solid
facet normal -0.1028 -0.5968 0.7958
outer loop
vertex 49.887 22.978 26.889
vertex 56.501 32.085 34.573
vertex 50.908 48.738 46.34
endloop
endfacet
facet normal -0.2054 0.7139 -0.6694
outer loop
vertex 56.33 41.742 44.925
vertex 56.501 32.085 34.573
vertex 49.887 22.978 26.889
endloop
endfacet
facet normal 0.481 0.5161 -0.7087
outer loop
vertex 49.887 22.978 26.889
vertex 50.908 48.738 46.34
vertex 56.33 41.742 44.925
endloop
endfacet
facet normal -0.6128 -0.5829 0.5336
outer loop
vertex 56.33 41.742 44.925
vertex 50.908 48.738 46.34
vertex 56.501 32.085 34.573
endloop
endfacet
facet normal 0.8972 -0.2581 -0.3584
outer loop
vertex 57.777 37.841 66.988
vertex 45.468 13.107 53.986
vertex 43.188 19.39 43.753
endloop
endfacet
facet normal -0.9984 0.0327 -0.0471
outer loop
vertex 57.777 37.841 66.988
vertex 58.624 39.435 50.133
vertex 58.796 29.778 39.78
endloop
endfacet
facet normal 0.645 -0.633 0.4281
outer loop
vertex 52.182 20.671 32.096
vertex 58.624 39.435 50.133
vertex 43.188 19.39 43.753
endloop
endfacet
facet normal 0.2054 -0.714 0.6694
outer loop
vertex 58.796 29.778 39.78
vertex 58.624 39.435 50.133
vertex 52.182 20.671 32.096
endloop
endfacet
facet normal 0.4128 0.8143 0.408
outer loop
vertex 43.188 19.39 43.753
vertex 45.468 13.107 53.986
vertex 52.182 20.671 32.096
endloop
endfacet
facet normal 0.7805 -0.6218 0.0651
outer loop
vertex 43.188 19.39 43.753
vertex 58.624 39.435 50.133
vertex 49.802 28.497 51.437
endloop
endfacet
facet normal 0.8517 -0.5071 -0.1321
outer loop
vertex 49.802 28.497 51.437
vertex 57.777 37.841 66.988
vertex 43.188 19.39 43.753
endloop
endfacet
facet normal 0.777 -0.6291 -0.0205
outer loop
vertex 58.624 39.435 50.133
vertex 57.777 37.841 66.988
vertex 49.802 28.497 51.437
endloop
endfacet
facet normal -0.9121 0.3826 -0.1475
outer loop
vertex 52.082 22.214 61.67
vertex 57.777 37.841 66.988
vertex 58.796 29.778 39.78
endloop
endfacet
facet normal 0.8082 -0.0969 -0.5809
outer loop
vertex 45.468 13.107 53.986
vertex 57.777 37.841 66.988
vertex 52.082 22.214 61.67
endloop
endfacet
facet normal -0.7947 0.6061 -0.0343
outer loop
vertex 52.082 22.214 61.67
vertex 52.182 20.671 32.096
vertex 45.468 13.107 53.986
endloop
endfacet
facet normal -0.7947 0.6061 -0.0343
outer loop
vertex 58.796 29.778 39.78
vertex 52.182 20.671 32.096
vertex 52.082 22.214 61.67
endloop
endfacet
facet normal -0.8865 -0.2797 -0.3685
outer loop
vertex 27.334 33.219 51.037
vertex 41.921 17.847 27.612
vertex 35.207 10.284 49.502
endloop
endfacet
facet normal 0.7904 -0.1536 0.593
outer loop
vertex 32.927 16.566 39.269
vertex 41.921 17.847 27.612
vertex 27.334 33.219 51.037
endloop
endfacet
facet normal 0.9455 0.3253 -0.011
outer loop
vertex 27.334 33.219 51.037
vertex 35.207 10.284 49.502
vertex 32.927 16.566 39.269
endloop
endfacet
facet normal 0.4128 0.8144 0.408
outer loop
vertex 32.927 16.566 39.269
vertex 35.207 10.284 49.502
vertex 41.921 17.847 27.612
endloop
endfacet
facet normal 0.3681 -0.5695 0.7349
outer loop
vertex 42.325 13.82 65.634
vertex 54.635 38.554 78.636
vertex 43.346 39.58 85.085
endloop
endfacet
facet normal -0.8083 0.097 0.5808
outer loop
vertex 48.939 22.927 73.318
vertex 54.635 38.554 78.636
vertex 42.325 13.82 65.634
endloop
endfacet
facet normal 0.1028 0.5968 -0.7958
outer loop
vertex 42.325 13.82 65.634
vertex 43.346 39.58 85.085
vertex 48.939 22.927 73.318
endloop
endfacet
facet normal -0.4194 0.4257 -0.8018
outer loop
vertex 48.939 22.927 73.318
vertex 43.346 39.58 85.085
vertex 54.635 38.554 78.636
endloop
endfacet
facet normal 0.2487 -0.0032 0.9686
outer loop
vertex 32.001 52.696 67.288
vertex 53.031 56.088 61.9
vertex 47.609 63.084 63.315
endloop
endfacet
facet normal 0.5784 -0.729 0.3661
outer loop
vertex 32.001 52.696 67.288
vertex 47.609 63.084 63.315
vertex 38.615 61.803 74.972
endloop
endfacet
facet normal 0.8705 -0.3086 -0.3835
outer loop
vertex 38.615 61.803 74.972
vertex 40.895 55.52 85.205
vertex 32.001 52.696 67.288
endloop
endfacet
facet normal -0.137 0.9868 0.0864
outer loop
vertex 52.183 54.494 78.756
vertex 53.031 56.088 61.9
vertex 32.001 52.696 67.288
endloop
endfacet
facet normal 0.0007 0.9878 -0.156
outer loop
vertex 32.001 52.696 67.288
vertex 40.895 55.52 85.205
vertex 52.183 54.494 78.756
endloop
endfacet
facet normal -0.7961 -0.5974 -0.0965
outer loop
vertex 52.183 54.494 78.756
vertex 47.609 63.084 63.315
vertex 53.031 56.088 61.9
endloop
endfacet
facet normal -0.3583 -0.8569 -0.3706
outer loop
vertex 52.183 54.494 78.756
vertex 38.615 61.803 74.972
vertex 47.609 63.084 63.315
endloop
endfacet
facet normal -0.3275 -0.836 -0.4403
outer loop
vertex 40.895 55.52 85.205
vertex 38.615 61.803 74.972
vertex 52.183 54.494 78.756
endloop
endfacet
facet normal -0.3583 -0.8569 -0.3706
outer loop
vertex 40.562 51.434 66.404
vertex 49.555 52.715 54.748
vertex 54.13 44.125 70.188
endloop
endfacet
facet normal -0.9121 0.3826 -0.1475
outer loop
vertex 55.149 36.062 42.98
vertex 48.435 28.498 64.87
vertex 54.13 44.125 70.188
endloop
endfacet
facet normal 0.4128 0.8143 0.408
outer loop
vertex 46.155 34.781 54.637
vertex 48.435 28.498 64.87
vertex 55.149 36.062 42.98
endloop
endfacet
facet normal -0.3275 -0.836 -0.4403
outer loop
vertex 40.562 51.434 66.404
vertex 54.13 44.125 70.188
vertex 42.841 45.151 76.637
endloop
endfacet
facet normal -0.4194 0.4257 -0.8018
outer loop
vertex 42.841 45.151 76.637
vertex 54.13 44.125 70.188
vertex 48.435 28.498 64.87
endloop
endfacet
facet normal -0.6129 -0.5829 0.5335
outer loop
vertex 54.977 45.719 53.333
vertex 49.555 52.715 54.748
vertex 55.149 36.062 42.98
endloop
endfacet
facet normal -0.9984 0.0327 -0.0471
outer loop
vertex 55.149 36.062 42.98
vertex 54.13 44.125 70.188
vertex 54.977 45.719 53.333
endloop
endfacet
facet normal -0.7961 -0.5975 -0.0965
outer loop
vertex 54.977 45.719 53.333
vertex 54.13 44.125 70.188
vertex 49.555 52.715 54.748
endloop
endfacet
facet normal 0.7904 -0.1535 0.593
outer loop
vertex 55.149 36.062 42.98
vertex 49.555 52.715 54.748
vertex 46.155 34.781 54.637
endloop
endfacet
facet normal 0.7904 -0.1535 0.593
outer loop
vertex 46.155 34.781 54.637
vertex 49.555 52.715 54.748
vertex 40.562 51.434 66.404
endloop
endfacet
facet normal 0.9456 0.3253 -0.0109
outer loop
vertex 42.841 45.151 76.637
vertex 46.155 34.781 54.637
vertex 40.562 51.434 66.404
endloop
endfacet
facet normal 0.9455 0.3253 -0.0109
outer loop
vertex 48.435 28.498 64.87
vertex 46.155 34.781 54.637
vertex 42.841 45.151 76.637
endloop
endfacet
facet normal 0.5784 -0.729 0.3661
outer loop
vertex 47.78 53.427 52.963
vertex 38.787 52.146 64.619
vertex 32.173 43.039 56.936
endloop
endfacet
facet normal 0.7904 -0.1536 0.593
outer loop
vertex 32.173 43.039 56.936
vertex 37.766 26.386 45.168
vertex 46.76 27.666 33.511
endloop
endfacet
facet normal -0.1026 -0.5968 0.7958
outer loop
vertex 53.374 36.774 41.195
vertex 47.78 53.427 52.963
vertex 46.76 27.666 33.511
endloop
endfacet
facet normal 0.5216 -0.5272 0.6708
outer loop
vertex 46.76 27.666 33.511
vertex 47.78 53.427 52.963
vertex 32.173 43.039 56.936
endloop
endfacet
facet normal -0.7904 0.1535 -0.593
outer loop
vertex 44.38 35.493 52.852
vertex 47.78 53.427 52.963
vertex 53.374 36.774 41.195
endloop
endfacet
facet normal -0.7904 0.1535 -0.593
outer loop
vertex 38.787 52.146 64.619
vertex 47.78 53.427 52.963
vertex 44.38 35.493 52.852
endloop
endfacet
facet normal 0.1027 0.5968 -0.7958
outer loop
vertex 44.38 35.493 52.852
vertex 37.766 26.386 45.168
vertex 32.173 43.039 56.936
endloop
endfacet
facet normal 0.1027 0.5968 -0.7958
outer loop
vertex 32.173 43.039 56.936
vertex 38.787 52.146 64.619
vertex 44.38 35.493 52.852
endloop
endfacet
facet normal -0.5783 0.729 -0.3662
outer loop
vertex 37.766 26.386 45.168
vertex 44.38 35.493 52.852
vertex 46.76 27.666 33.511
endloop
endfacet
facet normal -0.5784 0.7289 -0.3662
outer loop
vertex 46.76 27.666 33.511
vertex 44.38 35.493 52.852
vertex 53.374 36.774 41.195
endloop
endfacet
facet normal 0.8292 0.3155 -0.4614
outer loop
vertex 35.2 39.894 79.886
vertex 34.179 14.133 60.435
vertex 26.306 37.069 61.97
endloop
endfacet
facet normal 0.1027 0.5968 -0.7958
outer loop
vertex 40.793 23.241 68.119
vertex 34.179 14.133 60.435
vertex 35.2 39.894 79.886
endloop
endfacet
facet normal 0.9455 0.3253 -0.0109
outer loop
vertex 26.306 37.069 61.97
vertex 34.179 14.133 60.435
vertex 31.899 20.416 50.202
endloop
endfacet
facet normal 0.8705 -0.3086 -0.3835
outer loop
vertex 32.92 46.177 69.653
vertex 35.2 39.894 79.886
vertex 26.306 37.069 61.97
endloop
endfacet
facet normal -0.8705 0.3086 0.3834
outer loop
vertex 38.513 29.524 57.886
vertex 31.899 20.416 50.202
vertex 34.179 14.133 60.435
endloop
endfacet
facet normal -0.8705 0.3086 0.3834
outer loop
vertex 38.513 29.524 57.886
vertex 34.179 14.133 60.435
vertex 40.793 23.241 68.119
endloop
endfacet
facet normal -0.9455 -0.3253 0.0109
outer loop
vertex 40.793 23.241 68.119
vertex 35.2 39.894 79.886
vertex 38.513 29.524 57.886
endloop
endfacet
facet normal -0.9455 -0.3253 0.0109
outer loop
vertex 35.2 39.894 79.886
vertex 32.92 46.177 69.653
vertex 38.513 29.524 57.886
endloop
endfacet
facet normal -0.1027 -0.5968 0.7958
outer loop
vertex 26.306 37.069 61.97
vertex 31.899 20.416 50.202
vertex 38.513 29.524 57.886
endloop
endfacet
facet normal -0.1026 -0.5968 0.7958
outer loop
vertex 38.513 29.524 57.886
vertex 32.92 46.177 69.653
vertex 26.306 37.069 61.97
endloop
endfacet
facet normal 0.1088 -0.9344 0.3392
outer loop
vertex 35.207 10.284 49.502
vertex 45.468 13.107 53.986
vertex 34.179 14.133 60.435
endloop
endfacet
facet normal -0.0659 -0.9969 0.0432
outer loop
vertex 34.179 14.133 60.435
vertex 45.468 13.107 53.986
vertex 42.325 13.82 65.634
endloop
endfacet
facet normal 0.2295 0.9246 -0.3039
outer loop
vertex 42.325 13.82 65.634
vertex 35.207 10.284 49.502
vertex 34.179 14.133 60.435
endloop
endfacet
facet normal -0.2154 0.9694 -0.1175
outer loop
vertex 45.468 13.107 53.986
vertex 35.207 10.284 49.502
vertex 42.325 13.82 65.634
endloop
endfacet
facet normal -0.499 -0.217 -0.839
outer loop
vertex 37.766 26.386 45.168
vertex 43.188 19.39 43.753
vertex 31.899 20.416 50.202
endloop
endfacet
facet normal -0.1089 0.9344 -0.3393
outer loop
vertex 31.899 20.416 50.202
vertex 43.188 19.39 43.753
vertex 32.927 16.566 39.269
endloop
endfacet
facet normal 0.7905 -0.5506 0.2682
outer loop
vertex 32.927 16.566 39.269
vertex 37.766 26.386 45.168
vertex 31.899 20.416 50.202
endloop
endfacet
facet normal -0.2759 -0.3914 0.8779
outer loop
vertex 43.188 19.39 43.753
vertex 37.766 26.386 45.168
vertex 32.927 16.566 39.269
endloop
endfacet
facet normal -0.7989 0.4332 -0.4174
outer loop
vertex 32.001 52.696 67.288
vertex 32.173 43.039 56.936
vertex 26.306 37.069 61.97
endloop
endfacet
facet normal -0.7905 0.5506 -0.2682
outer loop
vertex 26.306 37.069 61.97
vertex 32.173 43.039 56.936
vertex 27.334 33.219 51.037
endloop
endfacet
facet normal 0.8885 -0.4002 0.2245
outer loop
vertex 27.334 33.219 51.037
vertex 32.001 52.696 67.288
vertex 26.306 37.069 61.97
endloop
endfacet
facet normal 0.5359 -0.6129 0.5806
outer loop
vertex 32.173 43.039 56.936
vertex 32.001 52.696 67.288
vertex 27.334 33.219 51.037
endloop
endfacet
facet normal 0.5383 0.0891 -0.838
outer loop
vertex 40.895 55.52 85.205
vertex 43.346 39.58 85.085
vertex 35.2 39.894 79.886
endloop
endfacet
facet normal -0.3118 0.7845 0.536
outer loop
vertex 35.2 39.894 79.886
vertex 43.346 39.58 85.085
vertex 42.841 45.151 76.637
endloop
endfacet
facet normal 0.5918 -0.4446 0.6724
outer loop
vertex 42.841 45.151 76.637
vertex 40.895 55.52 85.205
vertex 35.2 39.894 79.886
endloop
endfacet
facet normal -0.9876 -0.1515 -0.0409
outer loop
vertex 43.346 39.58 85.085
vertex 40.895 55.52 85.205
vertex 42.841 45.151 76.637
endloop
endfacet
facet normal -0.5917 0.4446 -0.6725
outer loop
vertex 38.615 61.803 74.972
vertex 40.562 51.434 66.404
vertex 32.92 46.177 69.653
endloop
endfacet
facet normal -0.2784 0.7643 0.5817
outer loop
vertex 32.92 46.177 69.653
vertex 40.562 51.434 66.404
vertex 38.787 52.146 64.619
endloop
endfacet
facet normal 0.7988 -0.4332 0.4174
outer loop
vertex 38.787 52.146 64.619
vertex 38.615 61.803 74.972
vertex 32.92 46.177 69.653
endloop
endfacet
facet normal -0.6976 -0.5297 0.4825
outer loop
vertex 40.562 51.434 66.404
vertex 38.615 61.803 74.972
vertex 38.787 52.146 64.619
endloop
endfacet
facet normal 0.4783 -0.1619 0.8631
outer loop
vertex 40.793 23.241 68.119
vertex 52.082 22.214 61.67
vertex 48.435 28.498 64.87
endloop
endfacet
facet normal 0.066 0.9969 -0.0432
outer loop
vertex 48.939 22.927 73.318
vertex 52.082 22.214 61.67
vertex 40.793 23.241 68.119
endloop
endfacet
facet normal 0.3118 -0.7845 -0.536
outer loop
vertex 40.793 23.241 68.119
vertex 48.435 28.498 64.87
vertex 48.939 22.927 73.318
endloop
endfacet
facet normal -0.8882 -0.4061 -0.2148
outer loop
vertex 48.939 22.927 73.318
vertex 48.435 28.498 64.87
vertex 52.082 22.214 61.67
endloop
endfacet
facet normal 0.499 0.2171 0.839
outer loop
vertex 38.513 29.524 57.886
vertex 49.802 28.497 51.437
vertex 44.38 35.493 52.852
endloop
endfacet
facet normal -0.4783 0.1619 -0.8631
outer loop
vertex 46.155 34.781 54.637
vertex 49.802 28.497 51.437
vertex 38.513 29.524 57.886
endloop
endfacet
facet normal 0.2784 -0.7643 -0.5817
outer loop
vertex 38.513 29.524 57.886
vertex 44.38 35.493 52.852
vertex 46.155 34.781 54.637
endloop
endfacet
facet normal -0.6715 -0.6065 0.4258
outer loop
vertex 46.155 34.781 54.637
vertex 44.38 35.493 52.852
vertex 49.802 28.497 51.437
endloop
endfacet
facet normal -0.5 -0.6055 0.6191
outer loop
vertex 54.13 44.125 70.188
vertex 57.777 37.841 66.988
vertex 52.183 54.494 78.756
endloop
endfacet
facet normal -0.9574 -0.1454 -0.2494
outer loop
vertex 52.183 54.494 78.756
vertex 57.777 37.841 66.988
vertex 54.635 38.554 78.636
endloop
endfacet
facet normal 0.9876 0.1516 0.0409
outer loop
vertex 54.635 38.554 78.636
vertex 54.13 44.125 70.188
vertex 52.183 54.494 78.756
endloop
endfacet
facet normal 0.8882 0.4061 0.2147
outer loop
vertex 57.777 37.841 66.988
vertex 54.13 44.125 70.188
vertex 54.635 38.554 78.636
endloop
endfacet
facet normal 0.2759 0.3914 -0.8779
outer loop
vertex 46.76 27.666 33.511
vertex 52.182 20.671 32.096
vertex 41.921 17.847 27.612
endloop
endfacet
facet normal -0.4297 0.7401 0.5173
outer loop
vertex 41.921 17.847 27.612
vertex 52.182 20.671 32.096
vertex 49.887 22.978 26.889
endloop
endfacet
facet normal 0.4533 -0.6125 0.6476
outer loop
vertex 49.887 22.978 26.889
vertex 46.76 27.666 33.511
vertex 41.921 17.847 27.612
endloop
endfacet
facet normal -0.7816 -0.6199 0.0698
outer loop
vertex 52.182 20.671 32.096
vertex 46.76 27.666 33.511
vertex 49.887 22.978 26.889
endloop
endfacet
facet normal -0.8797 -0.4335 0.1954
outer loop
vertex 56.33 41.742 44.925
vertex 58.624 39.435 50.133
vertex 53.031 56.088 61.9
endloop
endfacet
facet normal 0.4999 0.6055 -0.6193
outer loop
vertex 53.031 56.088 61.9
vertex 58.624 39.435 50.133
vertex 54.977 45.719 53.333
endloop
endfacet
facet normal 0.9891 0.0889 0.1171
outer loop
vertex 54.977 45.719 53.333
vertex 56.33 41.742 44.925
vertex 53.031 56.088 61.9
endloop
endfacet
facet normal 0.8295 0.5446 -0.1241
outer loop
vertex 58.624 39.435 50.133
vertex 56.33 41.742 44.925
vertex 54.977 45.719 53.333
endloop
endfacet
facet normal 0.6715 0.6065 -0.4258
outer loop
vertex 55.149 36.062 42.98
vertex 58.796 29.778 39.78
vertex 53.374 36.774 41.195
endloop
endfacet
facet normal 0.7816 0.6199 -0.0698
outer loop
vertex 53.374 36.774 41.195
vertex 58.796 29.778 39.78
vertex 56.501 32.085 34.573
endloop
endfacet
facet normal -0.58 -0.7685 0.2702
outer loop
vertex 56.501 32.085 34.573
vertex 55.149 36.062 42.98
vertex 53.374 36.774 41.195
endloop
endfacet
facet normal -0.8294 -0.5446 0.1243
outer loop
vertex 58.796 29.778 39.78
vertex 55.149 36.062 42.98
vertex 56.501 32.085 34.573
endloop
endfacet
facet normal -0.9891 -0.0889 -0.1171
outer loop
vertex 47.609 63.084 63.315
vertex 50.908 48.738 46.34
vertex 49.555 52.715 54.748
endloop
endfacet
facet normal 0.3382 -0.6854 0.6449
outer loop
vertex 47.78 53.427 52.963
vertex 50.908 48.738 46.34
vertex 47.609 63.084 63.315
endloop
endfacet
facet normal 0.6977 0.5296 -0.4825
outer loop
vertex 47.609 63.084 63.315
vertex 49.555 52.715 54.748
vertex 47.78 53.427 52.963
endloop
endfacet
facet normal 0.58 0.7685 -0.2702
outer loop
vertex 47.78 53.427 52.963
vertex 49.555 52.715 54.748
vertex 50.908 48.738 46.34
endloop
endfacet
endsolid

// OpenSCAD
// Auto-generated unified auxetic polyhedron (no hinge spheres)

points = [
    [50.907521, 48.738148, 46.340170],
    [56.500980, 32.085139, 34.572597],
    [49.886947, 22.977816, 26.888768],
    [56.329557, 41.742461, 44.925151],
    [43.188020, 19.389950, 43.752941],
    [45.467750, 13.107119, 53.985819],
    [57.776897, 37.841130, 66.988115],
    [58.795803, 29.778045, 39.780130],
    [58.624380, 39.435368, 50.132684],
    [52.181770, 20.670723, 32.096302],
    [49.802054, 28.497273, 51.436769],
    [52.081783, 22.214441, 61.669647],
    [35.206772, 10.283614, 49.501999],
    [41.920792, 17.847218, 27.612482],
    [27.333583, 33.219455, 51.036694],
    [32.927042, 16.566445, 39.269121],
    [43.346018, 39.580306, 85.085117],
    [54.634590, 38.553986, 78.636011],
    [42.325443, 13.819974, 65.633716],
    [48.939477, 22.927297, 73.317544],
    [47.608885, 63.084064, 63.315276],
    [53.030921, 56.088378, 61.900257],
    [32.001102, 52.695969, 67.288086],
    [38.615135, 61.803292, 74.971915],
    [40.894865, 55.520460, 85.204793],
    [52.183438, 54.494140, 78.755687],
    [54.129952, 44.124948, 70.188123],
    [49.555400, 52.714872, 54.747712],
    [40.561650, 51.434099, 66.404350],
    [48.434839, 28.498258, 64.869656],
    [55.148859, 36.061863, 42.980139],
    [46.155109, 34.781090, 54.636777],
    [42.841380, 45.151268, 76.637229],
    [54.977436, 45.719185, 53.332693],
    [32.172525, 43.038647, 56.935532],
    [38.786559, 52.145969, 64.619360],
    [47.780308, 53.426742, 52.962721],
    [46.759734, 27.666410, 33.511320],
    [37.765984, 26.385637, 45.167959],
    [53.373767, 36.773732, 41.195148],
    [44.380018, 35.492959, 52.851787],
    [26.305988, 37.069280, 61.969619],
    [34.179177, 14.133439, 60.434924],
    [35.199751, 39.893771, 79.886326],
    [40.793210, 23.240761, 68.118753],
    [31.899447, 20.416270, 50.202046],
    [32.920022, 46.176602, 69.653447],
    [38.513481, 29.523593, 57.885874],
];

faces = [
    [0, 1, 2],
    [2, 1, 3],
    [3, 0, 2],
    [1, 0, 3],
    [4, 5, 6],
    [7, 8, 6],
    [4, 8, 9],
    [9, 8, 7],
    [9, 5, 4],
    [10, 8, 4],
    [4, 6, 10],
    [10, 6, 8],
    [7, 6, 11],
    [11, 6, 5],
    [5, 9, 11],
    [11, 9, 7],
    [12, 13, 14],
    [14, 13, 15],
    [15, 12, 14],
    [13, 12, 15],
    [16, 17, 18],
    [18, 17, 19],
    [19, 16, 18],
    [17, 16, 19],
    [20, 21, 22],
    [23, 20, 22],
    [22, 24, 23],
    [22, 21, 25],
    [25, 24, 22],
    [21, 20, 25],
    [20, 23, 25],
    [25, 23, 24],
    [26, 27, 28],
    [26, 29, 30],
    [30, 29, 31],
    [32, 26, 28],
    [29, 26, 32],
    [30, 27, 33],
    [33, 26, 30],
    [27, 26, 33],
    [31, 27, 30],
    [28, 27, 31],
    [28, 31, 32],
    [32, 31, 29],
    [34, 35, 36],
    [37, 38, 34],
    [37, 36, 39],
    [34, 36, 37],
    [39, 36, 40],
    [40, 36, 35],
    [34, 38, 40],
    [40, 35, 34],
    [37, 40, 38],
    [39, 40, 37],
    [41, 42, 43],
    [43, 42, 44],
    [45, 42, 41],
    [41, 43, 46],
    [42, 45, 47],
    [44, 42, 47],
    [47, 43, 44],
    [47, 46, 43],
    [47, 45, 41],
    [41, 46, 47],
    [42, 5, 12],
    [18, 5, 42],
    [42, 12, 18],
    [18, 12, 5],
    [45, 4, 38],
    [15, 4, 45],
    [45, 38, 15],
    [15, 38, 4],
    [41, 34, 22],
    [14, 34, 41],
    [41, 22, 14],
    [14, 22, 34],
    [43, 16, 24],
    [32, 16, 43],
    [43, 24, 32],
    [32, 24, 16],
    [46, 28, 23],
    [35, 28, 46],
    [46, 23, 35],
    [35, 23, 28],
    [29, 11, 44],
    [44, 11, 19],
    [19, 29, 44],
    [11, 29, 19],
    [40, 10, 47],
    [47, 10, 31],
    [31, 40, 47],
    [10, 40, 31],
    [25, 6, 26],
    [17, 6, 25],
    [25, 26, 17],
    [17, 26, 6],
    [13, 9, 37],
    [2, 9, 13],
    [13, 37, 2],
    [2, 37, 9],
    [21, 8, 3],
    [33, 8, 21],
    [21, 3, 33],
    [33, 3, 8],
    [39, 7, 30],
    [1, 7, 39],
    [39, 30, 1],
    [1, 30, 7],
    [27, 0, 20],
    [20, 0, 36],
    [36, 27, 20],
    [0, 27, 36],
];

polyhedron(points = points, faces = faces);
